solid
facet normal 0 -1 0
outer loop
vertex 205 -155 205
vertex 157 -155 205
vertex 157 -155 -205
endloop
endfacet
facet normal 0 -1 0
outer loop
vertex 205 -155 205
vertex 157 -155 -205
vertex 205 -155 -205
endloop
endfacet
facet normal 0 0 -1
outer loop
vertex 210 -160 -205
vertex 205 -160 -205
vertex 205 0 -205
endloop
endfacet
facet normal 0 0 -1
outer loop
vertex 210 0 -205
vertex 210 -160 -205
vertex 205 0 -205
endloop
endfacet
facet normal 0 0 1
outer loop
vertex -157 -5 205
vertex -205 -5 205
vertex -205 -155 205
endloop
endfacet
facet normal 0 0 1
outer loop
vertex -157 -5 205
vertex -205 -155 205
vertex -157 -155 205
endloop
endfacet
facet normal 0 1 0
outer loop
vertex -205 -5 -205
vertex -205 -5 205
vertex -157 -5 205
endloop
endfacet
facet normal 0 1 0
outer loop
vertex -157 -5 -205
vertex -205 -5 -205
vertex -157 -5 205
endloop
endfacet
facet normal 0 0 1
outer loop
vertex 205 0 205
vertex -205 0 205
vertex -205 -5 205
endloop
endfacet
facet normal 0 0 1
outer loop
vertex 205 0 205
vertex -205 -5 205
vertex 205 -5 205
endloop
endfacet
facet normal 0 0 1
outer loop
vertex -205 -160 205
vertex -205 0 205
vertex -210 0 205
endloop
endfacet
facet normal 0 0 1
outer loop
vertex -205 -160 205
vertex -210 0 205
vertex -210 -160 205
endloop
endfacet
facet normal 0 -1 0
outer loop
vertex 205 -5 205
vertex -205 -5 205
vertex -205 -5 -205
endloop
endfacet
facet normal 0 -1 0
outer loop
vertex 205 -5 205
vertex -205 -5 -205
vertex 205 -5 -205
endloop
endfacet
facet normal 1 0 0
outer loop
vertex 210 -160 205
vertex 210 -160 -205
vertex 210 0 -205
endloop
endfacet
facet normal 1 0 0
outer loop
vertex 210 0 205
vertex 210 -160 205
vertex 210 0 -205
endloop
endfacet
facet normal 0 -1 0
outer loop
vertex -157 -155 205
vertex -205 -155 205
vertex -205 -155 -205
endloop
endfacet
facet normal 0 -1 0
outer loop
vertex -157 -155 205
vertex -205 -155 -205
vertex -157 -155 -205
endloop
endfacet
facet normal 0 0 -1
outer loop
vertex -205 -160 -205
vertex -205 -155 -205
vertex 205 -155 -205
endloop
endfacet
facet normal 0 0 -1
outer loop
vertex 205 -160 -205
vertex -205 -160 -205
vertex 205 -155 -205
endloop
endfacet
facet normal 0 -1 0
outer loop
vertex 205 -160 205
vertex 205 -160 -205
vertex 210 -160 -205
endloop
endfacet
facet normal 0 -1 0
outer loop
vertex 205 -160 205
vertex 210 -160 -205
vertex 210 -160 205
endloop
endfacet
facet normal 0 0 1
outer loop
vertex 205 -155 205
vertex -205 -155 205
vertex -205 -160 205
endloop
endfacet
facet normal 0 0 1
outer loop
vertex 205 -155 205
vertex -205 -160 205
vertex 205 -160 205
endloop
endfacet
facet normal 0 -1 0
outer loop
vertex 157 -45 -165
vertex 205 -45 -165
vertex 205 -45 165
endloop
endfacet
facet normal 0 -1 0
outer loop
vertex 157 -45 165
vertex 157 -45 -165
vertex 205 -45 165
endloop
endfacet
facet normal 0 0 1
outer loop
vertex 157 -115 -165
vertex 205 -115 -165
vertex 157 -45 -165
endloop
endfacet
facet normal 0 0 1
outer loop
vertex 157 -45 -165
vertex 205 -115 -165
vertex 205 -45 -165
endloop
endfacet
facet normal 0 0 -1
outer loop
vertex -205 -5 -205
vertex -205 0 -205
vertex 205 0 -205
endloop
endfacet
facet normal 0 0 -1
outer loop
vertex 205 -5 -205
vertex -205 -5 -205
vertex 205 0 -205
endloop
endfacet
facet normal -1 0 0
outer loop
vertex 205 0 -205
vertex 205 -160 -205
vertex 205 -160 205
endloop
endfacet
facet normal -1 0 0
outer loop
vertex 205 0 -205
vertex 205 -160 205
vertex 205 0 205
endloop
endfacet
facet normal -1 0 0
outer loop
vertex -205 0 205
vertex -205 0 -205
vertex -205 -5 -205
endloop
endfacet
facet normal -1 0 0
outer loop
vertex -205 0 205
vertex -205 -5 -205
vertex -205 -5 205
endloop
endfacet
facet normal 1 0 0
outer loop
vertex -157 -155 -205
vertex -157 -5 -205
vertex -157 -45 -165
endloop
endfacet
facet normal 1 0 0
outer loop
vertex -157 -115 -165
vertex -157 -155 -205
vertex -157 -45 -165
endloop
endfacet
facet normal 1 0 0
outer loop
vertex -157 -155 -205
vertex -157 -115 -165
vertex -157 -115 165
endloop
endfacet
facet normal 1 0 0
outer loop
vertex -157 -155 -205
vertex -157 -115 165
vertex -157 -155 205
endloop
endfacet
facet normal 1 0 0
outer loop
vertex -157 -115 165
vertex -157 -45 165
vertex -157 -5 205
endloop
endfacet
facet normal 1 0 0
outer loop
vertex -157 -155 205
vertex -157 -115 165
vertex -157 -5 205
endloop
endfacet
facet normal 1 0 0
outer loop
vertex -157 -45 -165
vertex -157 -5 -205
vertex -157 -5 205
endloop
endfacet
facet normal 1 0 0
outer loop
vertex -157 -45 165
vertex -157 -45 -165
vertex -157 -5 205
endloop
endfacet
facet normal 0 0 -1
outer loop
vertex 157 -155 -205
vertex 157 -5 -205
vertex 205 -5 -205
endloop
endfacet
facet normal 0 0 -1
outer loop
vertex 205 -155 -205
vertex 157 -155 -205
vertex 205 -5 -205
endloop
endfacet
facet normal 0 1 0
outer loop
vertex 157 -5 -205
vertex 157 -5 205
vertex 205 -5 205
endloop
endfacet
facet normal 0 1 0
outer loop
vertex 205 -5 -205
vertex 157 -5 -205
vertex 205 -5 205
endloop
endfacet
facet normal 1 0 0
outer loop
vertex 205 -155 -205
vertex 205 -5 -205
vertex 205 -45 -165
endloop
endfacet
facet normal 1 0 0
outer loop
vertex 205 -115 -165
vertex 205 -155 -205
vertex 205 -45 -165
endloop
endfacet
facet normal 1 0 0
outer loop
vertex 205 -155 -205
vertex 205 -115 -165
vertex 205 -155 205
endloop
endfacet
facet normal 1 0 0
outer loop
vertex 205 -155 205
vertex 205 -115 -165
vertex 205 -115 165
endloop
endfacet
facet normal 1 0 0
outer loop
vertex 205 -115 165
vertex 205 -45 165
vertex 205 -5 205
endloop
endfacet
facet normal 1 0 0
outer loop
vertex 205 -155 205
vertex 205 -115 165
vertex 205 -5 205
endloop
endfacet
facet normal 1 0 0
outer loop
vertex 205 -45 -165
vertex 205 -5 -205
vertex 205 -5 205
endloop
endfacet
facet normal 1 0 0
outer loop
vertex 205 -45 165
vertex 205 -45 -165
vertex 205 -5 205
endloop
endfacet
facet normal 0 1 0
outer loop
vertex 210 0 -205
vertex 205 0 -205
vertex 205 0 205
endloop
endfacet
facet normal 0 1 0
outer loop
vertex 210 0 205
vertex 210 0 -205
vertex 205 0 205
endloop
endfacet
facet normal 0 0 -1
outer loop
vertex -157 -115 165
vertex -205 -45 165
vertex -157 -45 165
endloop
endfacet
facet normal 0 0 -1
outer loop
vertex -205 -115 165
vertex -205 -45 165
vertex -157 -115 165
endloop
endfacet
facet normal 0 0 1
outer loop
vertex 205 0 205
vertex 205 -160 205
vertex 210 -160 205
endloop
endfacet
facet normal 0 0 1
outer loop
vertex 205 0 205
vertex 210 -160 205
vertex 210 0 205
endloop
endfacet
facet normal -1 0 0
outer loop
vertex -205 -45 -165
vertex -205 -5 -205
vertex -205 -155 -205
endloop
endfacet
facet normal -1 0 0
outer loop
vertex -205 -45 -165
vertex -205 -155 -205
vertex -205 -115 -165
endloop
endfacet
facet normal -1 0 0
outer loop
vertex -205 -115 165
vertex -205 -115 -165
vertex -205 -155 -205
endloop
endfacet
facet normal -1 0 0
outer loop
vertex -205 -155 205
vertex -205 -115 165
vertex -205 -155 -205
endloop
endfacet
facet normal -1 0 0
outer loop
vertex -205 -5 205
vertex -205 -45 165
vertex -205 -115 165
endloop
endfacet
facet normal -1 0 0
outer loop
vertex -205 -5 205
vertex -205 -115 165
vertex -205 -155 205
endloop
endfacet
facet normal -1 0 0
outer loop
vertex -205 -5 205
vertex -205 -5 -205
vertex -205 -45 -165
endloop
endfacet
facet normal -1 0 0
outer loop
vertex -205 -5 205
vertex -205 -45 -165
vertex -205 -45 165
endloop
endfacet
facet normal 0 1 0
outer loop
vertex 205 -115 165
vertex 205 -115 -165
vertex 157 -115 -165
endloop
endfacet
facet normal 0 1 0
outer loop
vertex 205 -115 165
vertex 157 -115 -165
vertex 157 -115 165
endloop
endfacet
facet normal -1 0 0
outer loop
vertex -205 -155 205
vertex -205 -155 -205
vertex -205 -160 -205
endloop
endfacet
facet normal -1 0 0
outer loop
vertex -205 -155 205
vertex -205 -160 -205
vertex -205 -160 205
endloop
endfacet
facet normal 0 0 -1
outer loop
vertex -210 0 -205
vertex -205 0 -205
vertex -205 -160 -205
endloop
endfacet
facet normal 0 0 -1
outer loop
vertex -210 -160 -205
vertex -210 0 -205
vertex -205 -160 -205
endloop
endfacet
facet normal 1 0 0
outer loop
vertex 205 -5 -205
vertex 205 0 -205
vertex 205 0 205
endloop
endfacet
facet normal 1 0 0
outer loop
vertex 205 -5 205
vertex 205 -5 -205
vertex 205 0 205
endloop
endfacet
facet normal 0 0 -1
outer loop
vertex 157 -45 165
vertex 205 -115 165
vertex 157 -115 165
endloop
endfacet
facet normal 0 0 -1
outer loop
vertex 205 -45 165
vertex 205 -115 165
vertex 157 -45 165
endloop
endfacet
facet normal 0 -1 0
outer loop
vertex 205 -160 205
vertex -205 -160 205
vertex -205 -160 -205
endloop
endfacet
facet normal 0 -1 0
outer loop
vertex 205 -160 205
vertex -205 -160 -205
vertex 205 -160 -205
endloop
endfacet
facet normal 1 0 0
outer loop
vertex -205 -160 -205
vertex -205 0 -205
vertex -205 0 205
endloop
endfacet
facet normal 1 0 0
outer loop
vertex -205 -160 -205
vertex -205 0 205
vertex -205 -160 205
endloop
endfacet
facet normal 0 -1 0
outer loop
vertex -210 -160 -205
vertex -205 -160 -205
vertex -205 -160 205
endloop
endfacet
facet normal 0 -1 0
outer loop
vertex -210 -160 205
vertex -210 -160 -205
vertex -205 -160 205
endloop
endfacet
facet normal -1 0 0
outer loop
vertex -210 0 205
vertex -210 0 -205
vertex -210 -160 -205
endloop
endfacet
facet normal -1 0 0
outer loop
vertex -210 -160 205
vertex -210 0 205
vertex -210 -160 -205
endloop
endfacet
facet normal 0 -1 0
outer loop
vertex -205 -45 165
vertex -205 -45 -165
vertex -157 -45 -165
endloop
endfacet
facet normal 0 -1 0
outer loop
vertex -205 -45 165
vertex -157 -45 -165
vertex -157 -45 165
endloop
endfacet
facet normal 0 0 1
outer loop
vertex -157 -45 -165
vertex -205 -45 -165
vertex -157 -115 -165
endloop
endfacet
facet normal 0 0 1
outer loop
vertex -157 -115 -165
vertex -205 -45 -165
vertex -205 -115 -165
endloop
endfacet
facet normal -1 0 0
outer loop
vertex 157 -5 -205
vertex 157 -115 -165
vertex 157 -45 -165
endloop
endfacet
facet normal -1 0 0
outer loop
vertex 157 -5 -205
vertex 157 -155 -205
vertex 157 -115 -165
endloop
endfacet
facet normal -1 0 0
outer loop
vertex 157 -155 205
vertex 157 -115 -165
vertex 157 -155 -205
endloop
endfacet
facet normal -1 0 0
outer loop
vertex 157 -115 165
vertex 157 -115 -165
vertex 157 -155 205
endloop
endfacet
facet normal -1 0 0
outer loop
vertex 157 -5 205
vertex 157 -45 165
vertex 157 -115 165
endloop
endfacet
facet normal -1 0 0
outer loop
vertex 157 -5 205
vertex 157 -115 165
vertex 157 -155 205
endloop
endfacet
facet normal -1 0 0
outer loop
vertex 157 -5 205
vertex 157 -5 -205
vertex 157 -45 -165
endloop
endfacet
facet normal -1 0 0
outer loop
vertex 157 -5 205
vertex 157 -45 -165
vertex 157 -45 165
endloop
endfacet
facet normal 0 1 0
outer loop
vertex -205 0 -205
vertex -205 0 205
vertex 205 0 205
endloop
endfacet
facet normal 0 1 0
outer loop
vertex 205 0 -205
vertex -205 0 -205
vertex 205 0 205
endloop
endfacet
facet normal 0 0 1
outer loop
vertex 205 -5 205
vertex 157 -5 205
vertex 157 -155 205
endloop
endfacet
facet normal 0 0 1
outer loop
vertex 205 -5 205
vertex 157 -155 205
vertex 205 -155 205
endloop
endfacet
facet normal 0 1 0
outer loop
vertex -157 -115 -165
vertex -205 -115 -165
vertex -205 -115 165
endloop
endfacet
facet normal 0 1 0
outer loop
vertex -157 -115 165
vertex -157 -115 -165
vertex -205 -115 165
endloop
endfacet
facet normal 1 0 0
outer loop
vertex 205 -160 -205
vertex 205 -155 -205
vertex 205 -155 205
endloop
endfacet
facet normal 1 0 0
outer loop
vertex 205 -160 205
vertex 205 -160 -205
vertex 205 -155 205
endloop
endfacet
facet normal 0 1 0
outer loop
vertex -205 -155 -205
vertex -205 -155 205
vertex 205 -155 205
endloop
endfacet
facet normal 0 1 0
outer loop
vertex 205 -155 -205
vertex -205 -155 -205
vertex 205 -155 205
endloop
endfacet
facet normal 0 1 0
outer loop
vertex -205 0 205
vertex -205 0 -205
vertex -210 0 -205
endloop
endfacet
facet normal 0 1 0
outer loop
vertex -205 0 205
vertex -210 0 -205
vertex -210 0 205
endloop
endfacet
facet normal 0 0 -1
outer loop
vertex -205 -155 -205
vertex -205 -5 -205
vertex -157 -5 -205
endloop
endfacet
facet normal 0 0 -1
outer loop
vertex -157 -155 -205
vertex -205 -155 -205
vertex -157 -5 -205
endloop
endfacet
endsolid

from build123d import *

# Parameters (mm, degrees)
F0_W      = 410
F0_H      = 410
F1_DEPTH  = 5
F2_W      = 48
F2_H      = 410
F3_DEPTH  = 150
F4_W      = 410
F4_H      = 410
F5_DEPTH  = 5
F6_W      = 160
F6_H      = 410
F7_DEPTH  = 5
F8_W      = 160
F8_H      = 410
F9_DEPTH  = 5
F10_W     = 70
F10_H     = 330
F11_DEPTH = 50
F12_W     = 70
F12_H     = 330
F13_DEPTH = 50


with BuildPart() as f1:
    # F0 (on Front) → F1 (new body)
    with BuildSketch(Plane.XZ):
        Rectangle(F0_W, F0_H)
    extrude(amount=F1_DEPTH)


with BuildPart() as f3:
    # F2 (on face) → F3 (new body)
    with BuildSketch(Plane.XZ.offset(5)):
        with Locations((-181, 0)):
            Rectangle(F2_W, F2_H)
        with Locations((181, 0)):
            Rectangle(F2_W, F2_H)
    extrude(amount=F3_DEPTH)

    # F10 (on face) → F11 (cut)
    with BuildSketch(Plane(origin=(-205, 0, 0), x_dir=(0, -1, 0), z_dir=(-1, 0, 0))):
        with Locations((80, 0)):
            Rectangle(F10_W, F10_H)
    extrude(amount=-F11_DEPTH, mode=Mode.SUBTRACT)

    # F12 (on face) → F13 (cut)
    with BuildSketch(Plane.YZ.offset(205)):
        with Locations((-80, 0)):
            Rectangle(F12_W, F12_H)
    extrude(amount=-F13_DEPTH, mode=Mode.SUBTRACT)


with BuildPart() as f5:
    # F4 (on face) → F5 (new body)
    with BuildSketch(Plane.XZ.offset(155)):
        Rectangle(F4_W, F4_H)
    extrude(amount=F5_DEPTH)


with BuildPart() as f7:
    # F6 (on face) → F7 (new body)
    with BuildSketch(Plane(origin=(-205, 0, 0), x_dir=(0, -1, 0), z_dir=(-1, 0, 0))):
        with Locations((80, 0)):
            Rectangle(F6_W, F6_H)
    extrude(amount=F7_DEPTH)


with BuildPart() as f9:
    # F8 (on face) → F9 (new body)
    with BuildSketch(Plane.YZ.offset(205)):
        with Locations((-80, 0)):
            Rectangle(F8_W, F8_H)
    extrude(amount=F9_DEPTH)


solid = Compound([f1.part, f3.part, f5.part, f7.part, f9.part])
